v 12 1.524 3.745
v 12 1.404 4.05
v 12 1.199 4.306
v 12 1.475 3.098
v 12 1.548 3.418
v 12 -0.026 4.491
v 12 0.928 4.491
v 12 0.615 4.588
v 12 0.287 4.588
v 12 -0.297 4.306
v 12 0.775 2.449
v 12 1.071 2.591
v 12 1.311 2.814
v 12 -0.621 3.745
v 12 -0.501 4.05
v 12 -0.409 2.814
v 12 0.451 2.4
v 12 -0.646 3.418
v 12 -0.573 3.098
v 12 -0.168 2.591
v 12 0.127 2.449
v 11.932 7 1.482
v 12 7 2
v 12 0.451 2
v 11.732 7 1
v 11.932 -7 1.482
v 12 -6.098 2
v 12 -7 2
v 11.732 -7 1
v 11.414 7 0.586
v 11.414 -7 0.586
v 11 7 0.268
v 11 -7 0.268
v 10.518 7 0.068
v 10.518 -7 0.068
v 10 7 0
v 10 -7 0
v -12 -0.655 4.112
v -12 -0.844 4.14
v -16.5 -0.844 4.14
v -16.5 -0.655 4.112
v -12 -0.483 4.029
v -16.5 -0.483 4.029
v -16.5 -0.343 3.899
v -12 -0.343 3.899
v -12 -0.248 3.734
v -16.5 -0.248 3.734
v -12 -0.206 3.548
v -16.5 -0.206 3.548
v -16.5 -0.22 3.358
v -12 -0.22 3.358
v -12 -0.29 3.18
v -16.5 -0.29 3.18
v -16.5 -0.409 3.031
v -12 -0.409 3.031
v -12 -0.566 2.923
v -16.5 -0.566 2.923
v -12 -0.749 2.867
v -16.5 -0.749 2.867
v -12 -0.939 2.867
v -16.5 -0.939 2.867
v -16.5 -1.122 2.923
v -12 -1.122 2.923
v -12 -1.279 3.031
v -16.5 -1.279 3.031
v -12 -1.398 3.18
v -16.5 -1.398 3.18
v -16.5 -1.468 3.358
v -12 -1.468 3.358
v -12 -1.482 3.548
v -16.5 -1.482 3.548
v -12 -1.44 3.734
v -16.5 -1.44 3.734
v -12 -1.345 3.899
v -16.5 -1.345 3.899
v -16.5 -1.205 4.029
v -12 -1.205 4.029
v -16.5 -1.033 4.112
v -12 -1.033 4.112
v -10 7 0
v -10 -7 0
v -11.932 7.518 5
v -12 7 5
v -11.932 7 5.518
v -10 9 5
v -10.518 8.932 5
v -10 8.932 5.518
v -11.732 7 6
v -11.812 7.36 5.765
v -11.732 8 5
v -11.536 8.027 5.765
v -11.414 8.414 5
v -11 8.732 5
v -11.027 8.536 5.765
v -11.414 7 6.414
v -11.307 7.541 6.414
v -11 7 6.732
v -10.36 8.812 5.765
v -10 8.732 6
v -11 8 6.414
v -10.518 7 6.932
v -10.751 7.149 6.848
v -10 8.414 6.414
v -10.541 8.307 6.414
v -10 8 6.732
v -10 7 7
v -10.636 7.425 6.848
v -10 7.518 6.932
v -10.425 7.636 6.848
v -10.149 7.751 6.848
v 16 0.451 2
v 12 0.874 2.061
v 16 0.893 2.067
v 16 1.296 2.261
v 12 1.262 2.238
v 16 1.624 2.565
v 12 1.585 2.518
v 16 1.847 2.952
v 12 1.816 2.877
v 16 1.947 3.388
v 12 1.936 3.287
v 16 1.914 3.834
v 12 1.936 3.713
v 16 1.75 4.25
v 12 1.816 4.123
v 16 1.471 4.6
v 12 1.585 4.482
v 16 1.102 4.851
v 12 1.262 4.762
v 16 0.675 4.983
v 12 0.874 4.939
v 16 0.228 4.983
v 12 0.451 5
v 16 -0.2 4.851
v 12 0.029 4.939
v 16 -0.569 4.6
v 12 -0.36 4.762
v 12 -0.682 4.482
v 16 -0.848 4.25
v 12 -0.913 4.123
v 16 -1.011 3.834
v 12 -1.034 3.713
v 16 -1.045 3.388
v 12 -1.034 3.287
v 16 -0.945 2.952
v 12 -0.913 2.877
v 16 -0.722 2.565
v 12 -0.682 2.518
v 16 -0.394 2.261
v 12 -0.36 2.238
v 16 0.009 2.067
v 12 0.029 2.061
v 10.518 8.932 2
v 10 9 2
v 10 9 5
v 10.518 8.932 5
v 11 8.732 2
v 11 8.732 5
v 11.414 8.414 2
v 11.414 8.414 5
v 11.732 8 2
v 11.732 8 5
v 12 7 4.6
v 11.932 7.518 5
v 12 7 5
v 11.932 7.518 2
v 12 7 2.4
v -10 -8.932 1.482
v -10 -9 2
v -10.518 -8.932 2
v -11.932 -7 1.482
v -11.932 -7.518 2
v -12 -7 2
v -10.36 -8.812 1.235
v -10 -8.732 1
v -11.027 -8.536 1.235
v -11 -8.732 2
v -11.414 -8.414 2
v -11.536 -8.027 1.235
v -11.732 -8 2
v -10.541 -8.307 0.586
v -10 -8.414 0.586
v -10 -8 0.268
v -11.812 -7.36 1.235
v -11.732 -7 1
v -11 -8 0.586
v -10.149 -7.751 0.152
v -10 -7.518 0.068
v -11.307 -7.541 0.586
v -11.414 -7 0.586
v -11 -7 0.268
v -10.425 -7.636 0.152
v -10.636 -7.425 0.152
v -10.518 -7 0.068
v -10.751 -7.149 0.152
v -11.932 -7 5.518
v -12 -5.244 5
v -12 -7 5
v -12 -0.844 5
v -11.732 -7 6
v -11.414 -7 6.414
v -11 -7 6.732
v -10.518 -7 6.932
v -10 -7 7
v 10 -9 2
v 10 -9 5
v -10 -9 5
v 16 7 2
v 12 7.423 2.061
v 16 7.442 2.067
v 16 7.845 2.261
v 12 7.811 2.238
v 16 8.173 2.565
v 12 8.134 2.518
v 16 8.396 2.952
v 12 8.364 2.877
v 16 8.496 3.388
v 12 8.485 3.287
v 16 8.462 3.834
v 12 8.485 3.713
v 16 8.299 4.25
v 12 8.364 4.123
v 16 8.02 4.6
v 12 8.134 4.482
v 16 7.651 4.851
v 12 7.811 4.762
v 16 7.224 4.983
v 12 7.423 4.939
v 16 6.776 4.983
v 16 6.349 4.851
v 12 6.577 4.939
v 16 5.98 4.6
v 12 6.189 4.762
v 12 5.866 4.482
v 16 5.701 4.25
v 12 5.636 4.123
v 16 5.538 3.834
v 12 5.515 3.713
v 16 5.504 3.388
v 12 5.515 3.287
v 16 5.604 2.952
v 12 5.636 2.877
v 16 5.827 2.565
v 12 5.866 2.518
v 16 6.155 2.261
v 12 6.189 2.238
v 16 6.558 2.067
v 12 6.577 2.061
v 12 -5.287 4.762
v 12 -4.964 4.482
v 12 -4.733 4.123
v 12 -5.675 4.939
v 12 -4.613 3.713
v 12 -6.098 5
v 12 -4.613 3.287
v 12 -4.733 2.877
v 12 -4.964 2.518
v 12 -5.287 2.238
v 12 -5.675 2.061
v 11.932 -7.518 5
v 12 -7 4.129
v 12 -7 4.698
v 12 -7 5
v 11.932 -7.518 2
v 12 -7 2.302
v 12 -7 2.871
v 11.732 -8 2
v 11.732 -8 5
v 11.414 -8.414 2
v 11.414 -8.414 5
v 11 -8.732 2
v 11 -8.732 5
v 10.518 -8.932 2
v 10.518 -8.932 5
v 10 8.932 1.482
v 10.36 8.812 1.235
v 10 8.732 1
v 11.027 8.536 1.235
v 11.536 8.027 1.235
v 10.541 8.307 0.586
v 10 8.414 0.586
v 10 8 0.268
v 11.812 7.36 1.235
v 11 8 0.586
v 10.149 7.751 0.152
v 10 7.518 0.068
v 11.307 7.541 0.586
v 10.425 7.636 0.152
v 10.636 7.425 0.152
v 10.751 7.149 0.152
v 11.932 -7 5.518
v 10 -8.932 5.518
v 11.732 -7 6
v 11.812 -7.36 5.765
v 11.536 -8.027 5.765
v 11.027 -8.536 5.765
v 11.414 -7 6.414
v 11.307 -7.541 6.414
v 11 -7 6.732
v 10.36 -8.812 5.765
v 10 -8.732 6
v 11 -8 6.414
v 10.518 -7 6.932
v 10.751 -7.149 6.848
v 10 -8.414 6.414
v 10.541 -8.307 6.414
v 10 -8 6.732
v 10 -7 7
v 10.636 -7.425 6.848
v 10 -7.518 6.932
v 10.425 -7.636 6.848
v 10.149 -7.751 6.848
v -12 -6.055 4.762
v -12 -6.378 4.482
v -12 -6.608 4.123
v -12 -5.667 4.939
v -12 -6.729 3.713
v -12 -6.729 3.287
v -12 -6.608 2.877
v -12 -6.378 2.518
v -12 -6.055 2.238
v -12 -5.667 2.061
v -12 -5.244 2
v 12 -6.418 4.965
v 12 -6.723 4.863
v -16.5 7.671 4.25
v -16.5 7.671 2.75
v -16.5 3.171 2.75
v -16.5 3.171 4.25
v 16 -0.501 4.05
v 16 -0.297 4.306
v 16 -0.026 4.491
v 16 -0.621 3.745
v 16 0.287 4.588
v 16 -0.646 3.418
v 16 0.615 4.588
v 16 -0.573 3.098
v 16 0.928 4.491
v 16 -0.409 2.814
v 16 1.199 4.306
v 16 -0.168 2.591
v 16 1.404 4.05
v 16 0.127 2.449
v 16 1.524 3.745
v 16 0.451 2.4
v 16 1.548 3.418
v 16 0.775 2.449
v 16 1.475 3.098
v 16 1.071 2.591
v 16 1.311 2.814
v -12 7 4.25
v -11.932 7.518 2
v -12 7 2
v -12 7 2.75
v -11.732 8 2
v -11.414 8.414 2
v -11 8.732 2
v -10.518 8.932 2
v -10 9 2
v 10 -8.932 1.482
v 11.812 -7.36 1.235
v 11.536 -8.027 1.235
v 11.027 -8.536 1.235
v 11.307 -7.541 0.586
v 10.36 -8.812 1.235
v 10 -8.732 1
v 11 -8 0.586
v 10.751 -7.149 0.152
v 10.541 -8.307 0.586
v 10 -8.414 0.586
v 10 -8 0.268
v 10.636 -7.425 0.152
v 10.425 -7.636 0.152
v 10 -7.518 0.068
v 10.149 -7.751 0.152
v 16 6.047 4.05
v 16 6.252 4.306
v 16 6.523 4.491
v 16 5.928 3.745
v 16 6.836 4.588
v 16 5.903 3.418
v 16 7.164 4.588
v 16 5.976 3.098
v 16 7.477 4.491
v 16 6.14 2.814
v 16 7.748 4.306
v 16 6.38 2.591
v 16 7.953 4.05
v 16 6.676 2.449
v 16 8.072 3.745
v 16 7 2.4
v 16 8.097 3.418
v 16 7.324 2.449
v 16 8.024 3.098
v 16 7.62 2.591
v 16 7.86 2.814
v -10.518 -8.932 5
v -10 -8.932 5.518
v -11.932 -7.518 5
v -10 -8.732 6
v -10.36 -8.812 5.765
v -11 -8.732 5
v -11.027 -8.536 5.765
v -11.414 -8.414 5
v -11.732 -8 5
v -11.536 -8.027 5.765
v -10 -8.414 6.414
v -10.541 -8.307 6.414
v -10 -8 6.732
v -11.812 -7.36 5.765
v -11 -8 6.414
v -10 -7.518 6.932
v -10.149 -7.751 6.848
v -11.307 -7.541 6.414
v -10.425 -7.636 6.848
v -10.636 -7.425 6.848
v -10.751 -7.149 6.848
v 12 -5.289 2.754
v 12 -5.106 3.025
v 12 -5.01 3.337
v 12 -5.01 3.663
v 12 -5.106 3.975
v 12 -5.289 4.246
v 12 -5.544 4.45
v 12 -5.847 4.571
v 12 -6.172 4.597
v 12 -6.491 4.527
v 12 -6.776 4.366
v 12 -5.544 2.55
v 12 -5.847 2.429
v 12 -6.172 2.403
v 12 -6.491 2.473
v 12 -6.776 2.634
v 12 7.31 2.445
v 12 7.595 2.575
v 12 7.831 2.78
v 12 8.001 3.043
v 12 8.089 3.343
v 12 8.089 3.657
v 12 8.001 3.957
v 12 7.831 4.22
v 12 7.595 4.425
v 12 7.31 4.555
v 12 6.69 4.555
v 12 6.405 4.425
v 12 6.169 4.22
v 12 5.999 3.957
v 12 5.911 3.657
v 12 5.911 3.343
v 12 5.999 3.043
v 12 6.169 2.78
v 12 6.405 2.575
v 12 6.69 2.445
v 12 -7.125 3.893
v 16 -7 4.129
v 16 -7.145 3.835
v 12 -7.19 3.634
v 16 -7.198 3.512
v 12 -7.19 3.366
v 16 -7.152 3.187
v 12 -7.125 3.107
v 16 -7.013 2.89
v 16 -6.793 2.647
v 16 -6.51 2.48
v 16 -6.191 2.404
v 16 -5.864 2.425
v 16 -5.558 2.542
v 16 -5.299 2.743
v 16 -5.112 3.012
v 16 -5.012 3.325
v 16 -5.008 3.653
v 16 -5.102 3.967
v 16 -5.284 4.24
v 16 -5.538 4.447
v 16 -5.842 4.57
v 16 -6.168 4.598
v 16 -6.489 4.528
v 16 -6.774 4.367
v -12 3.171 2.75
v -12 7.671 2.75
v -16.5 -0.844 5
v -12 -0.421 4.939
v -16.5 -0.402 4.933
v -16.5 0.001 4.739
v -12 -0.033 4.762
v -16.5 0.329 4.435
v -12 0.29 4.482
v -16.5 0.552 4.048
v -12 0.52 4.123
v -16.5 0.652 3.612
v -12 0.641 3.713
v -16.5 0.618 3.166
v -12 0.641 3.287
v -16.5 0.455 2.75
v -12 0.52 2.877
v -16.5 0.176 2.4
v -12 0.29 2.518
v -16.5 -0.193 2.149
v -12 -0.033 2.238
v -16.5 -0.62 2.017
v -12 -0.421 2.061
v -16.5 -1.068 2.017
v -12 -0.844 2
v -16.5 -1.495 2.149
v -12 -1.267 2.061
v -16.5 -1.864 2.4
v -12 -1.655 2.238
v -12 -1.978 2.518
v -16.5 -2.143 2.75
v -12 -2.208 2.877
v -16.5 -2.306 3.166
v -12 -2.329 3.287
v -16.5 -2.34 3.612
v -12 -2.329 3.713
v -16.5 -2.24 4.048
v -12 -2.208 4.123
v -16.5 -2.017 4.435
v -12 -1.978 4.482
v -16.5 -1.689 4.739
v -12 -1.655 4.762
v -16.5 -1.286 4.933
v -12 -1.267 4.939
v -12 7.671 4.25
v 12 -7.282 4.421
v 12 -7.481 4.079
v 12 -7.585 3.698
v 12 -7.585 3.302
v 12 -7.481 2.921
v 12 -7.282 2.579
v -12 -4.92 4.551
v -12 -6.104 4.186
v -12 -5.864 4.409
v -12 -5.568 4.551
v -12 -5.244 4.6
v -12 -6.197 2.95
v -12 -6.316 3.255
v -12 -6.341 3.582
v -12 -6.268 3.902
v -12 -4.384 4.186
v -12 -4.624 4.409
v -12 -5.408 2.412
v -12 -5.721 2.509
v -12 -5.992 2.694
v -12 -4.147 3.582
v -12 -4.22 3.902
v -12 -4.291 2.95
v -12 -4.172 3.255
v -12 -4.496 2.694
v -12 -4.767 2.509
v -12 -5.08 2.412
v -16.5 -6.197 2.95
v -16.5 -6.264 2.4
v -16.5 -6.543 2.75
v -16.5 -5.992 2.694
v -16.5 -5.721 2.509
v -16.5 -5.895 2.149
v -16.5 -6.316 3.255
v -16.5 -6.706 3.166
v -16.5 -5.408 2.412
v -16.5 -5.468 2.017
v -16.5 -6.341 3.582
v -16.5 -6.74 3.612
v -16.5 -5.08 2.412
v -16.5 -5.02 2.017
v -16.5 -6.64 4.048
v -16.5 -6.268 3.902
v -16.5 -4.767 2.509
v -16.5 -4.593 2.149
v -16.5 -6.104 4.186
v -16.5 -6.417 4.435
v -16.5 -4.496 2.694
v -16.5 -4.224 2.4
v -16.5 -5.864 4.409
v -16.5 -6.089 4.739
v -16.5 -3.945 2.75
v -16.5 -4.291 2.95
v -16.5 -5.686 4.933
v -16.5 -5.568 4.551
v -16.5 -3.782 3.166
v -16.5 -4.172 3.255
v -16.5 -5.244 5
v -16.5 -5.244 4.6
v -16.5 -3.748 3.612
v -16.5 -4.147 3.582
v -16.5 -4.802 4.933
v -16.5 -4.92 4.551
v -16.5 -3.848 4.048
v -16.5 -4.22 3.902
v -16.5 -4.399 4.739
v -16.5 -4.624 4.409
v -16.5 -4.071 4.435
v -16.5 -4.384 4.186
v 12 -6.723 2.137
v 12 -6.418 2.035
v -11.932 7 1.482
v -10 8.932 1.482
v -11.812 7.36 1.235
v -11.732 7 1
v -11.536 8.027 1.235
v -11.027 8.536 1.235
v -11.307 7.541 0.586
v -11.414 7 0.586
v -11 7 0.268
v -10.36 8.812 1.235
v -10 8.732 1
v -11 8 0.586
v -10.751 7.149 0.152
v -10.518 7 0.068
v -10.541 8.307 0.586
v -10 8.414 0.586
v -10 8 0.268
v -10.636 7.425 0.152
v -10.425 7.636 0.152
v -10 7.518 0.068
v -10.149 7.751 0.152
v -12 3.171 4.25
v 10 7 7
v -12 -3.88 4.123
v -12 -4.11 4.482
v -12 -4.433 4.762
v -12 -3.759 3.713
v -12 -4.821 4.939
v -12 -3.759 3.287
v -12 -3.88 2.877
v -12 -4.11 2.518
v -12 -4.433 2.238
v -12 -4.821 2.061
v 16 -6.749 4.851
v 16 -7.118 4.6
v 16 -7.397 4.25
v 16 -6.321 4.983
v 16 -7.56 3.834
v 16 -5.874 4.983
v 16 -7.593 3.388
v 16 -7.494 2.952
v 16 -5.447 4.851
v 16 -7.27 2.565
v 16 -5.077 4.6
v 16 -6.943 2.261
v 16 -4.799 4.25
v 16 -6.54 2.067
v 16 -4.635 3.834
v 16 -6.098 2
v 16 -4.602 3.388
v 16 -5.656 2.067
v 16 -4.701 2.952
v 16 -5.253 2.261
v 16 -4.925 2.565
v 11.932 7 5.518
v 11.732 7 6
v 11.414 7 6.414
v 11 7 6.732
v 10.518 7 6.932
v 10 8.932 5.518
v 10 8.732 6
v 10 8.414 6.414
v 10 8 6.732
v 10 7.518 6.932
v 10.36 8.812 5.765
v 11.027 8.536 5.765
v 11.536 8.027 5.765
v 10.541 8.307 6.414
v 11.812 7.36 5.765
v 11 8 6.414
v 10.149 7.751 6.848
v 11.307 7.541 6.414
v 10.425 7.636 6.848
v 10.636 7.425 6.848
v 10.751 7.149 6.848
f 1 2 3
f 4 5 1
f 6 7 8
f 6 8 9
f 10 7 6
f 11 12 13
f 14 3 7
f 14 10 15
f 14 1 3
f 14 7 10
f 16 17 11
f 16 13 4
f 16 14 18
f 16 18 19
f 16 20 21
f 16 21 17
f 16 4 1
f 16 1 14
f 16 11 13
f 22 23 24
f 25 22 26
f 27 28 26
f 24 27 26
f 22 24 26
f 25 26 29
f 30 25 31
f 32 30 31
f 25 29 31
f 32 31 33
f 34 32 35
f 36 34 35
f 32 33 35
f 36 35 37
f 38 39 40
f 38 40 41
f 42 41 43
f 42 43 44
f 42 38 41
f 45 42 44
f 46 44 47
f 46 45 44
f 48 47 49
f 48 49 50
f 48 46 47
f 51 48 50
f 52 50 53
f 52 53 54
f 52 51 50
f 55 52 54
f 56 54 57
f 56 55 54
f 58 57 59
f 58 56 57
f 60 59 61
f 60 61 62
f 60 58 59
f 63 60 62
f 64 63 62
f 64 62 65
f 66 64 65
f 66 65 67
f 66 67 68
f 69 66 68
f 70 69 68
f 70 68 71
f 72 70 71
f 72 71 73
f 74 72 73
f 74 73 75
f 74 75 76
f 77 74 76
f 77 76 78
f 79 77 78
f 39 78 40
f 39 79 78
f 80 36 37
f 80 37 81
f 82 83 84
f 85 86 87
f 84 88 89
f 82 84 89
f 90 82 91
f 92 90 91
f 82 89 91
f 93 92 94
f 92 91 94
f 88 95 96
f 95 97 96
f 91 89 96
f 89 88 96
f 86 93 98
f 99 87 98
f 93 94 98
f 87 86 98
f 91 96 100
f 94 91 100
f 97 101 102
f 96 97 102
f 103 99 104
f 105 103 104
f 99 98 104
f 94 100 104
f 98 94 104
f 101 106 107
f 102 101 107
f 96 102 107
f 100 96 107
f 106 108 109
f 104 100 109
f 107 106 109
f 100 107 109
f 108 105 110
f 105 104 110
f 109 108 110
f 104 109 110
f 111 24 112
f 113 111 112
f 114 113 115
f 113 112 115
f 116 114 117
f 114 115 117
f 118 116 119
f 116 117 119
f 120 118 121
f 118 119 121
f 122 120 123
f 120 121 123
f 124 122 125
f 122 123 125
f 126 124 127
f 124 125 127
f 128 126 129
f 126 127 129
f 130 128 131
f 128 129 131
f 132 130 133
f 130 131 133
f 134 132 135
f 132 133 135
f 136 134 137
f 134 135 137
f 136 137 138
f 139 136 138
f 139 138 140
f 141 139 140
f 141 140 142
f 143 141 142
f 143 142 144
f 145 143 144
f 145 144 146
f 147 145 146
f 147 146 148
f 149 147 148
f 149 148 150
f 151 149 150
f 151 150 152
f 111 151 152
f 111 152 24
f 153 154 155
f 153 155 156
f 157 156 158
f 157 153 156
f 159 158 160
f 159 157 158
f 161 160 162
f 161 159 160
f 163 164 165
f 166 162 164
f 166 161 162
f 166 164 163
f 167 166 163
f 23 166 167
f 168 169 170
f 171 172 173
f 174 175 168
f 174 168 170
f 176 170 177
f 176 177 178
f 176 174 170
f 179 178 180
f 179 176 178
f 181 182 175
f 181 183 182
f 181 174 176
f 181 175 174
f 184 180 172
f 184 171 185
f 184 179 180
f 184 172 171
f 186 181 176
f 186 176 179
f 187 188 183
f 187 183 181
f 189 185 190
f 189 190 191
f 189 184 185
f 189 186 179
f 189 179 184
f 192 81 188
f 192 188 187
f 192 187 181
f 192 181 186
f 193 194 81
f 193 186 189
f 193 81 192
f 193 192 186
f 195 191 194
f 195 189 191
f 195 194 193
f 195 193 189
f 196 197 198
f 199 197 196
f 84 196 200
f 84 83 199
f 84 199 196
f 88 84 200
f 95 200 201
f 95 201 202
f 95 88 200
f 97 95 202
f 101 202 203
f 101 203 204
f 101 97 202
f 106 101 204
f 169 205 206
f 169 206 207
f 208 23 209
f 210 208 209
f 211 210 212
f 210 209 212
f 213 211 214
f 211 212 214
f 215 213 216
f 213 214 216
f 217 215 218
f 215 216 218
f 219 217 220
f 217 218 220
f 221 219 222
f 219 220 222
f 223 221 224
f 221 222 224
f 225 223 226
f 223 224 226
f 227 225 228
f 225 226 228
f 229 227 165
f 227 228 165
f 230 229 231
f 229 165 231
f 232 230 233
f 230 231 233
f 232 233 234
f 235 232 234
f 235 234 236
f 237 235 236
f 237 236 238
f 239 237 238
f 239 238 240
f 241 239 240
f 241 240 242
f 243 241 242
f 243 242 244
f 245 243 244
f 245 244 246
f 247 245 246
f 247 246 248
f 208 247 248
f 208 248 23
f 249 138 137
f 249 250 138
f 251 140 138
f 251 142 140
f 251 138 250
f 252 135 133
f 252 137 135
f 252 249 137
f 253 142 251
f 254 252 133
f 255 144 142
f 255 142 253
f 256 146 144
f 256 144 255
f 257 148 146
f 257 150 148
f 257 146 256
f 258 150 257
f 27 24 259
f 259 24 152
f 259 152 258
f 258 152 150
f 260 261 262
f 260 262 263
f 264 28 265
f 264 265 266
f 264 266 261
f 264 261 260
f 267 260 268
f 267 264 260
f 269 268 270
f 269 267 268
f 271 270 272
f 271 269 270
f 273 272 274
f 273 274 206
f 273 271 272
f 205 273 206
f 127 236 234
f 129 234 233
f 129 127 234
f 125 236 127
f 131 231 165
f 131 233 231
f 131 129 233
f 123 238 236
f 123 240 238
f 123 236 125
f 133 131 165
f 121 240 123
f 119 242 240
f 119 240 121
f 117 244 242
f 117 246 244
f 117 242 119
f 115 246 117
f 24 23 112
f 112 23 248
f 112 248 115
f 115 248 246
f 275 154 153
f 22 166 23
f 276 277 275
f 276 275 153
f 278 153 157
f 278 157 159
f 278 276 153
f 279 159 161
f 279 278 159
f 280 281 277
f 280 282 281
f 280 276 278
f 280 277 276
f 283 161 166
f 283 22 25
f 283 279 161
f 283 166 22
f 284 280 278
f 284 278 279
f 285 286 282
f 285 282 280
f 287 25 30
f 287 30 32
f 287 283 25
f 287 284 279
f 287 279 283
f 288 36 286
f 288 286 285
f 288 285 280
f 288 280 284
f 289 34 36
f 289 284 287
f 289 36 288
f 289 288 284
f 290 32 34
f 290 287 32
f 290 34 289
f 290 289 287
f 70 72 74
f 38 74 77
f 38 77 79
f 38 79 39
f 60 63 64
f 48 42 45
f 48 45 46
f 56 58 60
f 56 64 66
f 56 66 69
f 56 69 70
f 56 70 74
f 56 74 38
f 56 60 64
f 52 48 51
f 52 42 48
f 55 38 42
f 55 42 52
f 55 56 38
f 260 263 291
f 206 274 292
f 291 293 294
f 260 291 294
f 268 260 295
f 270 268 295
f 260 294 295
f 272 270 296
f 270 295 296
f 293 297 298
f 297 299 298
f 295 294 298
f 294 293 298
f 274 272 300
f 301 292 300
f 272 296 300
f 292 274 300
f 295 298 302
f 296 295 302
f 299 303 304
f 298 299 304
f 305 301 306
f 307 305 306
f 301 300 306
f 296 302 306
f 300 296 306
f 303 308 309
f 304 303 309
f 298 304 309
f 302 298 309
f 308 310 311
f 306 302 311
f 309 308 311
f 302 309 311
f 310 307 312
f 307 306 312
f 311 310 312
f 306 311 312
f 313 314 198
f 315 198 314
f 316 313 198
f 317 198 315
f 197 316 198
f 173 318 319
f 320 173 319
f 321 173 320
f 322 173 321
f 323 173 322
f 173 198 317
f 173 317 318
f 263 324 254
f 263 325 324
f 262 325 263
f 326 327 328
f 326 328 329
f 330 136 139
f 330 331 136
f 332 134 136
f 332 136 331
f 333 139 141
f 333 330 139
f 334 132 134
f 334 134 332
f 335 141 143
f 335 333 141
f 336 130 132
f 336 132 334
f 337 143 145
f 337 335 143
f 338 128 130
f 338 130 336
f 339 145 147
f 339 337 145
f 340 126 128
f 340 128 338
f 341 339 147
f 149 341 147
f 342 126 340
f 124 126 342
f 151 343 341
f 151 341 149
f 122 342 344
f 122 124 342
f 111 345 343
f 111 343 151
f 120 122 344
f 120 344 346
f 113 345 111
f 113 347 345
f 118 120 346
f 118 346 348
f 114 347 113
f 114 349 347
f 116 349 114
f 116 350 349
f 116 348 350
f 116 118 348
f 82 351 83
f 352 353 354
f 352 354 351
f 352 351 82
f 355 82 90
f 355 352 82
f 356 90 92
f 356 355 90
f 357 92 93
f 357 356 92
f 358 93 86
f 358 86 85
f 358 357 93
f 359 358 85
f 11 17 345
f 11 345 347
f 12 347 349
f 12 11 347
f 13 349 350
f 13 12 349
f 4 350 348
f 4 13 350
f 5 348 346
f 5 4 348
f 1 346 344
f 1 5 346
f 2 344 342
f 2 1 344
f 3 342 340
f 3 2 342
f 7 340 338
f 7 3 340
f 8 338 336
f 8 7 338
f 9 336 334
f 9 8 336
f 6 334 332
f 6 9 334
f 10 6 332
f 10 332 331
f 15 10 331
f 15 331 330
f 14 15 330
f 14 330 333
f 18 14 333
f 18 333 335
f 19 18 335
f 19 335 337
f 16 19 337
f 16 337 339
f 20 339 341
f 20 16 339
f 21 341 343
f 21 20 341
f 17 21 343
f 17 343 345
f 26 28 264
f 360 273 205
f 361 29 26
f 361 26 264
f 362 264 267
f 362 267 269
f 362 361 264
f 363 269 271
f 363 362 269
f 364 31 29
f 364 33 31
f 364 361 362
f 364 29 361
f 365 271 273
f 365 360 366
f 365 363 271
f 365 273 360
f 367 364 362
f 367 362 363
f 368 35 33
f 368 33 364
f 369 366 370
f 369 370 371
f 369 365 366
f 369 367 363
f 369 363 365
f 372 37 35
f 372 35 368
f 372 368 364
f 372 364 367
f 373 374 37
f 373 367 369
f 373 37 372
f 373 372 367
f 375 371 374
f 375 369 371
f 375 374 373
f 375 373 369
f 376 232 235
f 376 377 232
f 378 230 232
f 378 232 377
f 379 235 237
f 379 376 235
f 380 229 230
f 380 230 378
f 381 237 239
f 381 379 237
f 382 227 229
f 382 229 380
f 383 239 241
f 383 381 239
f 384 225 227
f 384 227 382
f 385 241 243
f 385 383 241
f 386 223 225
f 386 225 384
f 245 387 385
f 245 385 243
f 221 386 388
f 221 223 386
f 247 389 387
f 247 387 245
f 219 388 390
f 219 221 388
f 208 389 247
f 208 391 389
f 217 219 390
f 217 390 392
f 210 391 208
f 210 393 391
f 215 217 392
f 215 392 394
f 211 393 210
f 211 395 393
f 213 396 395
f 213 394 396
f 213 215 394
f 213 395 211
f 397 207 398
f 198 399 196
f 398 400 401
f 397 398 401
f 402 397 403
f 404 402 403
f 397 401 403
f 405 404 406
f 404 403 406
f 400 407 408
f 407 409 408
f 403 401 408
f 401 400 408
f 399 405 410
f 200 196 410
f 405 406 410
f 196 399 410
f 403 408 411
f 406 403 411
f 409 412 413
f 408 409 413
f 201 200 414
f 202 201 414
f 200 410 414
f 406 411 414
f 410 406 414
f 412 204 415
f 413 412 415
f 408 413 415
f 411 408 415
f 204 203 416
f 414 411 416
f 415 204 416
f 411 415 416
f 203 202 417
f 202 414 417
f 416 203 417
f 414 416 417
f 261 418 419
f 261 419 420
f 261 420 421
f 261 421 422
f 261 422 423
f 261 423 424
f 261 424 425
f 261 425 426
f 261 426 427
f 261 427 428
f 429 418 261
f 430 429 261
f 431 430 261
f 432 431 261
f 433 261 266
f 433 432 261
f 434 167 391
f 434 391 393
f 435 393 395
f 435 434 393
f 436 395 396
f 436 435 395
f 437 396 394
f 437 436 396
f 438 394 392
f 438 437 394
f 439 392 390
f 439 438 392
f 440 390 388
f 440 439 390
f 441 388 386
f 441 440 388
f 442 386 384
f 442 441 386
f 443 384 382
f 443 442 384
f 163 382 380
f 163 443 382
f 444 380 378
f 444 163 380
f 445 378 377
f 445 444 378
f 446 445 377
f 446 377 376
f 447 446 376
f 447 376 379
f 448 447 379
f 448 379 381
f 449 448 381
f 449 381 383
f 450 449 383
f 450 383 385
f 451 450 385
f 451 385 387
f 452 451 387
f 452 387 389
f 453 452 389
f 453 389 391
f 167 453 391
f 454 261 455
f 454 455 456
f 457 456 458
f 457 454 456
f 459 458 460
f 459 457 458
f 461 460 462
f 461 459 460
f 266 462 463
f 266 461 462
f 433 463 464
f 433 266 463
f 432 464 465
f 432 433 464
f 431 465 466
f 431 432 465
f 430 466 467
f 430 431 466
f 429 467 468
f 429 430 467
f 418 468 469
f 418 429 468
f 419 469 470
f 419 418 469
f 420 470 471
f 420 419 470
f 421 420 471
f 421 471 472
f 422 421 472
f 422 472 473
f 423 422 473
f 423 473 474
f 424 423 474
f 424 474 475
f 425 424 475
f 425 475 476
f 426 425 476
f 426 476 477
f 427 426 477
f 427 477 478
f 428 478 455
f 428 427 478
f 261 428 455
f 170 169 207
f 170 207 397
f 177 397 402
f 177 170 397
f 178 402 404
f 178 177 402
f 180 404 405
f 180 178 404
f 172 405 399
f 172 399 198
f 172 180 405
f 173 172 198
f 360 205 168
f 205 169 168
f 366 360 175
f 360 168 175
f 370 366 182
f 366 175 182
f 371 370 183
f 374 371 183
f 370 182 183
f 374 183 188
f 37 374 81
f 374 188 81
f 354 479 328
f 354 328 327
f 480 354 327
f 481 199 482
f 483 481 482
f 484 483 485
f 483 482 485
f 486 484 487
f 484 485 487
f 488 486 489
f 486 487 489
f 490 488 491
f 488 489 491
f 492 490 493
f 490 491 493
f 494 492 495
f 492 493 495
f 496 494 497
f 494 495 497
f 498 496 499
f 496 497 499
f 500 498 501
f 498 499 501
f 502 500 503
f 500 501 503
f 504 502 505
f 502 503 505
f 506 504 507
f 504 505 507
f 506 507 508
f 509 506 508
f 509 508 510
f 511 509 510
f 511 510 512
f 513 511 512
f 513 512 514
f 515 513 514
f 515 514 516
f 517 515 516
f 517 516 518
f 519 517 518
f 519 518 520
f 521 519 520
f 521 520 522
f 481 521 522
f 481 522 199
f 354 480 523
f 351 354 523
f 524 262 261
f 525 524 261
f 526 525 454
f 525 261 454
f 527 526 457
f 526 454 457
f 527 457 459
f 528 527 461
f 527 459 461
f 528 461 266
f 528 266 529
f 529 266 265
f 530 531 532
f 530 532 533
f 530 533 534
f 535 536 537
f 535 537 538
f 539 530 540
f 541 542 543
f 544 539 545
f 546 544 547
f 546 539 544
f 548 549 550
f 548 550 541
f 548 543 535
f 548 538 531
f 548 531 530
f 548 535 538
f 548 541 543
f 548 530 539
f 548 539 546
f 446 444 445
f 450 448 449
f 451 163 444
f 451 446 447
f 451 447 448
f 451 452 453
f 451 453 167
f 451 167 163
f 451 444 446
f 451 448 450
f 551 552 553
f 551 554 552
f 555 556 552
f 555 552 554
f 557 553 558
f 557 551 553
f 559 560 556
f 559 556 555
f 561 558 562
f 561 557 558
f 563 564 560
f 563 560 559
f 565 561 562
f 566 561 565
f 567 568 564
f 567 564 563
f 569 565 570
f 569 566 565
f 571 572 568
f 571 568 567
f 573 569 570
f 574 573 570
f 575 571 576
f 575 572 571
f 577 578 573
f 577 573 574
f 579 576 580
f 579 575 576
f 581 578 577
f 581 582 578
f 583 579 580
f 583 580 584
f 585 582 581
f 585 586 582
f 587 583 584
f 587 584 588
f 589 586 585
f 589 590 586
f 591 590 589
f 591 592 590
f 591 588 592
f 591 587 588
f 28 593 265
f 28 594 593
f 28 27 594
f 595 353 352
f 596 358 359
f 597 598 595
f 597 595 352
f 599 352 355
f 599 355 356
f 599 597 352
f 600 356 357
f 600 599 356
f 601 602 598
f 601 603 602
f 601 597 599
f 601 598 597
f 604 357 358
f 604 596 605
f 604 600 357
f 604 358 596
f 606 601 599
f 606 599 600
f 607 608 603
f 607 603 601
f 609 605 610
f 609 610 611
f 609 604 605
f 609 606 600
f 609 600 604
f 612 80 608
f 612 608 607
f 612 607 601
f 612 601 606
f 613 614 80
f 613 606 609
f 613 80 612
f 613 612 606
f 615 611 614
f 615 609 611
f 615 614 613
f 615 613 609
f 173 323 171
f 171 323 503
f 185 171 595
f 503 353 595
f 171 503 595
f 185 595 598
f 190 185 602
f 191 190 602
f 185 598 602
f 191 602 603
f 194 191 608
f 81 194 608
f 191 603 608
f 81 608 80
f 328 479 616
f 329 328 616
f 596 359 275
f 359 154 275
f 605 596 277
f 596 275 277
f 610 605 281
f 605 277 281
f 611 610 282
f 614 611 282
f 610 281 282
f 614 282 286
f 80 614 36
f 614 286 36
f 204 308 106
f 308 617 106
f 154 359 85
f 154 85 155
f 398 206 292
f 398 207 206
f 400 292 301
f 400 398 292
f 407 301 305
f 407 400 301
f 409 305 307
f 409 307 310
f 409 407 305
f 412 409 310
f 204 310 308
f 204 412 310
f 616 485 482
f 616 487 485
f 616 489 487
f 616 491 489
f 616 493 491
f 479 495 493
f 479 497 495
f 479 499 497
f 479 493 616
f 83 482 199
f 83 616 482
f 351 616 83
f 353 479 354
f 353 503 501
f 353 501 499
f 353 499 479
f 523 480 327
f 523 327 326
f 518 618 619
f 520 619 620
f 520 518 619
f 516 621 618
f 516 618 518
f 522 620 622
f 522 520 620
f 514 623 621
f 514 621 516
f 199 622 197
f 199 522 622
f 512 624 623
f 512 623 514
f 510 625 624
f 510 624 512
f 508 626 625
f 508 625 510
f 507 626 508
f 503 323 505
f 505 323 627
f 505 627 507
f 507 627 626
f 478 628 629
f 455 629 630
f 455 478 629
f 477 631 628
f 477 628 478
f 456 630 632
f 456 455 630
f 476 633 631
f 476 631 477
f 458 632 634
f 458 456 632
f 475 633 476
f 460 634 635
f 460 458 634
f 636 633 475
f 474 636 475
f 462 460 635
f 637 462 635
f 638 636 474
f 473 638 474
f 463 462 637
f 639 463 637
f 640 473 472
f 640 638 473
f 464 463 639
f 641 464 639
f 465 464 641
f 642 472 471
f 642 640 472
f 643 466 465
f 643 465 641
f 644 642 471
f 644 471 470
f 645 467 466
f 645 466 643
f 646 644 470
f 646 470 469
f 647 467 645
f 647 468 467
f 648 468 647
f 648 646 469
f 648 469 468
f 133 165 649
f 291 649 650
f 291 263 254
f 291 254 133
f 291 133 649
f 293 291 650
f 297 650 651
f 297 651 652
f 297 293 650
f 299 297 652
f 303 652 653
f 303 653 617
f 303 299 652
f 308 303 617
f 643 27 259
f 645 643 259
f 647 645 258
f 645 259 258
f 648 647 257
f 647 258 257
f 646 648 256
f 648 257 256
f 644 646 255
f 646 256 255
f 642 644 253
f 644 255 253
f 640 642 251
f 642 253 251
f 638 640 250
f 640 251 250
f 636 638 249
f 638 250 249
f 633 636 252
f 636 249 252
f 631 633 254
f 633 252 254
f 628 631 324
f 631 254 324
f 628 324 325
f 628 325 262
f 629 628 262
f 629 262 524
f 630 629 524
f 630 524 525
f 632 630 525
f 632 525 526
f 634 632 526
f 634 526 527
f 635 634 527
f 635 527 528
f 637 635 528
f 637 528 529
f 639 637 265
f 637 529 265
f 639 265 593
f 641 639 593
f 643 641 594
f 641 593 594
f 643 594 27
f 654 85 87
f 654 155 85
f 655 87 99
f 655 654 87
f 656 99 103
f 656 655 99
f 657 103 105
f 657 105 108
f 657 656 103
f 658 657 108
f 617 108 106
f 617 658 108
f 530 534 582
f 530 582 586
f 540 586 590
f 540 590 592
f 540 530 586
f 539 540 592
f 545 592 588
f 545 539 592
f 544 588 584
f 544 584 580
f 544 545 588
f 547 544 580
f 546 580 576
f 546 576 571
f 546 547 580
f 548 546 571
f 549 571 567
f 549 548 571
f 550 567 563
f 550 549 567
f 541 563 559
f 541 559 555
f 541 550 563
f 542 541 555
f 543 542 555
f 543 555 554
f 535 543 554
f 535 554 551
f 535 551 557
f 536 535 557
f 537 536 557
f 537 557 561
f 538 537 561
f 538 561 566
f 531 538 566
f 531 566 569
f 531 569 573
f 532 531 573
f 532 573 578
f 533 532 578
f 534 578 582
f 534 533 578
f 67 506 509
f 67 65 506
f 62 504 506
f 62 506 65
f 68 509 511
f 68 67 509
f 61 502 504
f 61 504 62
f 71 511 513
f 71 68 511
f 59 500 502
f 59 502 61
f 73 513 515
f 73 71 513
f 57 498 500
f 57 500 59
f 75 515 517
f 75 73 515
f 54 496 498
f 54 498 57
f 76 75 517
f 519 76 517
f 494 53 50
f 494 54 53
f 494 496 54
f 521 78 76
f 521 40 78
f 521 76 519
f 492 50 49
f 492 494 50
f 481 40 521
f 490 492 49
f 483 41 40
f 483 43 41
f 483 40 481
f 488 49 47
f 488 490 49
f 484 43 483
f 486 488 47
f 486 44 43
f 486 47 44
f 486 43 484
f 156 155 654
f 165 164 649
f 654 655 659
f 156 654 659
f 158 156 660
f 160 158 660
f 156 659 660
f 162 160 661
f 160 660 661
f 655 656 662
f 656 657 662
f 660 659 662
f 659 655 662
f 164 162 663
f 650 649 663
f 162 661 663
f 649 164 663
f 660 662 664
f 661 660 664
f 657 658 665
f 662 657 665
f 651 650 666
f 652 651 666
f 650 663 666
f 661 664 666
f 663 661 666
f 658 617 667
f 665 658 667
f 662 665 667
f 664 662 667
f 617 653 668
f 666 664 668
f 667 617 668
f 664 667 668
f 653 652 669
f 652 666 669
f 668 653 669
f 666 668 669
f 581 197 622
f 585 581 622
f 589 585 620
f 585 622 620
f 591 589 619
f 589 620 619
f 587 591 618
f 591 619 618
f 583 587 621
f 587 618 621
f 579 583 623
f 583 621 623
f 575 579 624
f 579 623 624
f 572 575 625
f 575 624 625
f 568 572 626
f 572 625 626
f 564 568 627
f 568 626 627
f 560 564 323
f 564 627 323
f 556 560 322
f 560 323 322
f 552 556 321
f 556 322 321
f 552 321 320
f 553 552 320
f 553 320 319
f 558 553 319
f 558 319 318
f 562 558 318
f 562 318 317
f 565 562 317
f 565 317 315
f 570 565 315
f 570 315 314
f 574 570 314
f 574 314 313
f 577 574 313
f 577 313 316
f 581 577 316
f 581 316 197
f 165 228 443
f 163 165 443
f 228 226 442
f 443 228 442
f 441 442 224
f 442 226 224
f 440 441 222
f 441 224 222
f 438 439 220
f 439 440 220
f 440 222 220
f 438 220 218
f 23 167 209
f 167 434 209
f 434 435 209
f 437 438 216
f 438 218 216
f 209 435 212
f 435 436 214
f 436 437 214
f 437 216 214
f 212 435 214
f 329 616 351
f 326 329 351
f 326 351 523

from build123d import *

# Parameters (mm, degrees)
BOSS_EXTRUDE1_DEPTH = 7
FILLET1_R           = 2
SKETCH3_R           = 1.5
SKETCH3_R_2         = 1.1
BOSS_EXTRUDE2_DEPTH = 4
SKETCH4_R           = 1.5
SKETCH4_R_2         = 0.640256745
SKETCH4_R_3         = 1.1
SKETCH4_W           = 1.5
SKETCH4_H           = 4.5
BOSS_EXTRUDE3_DEPTH = 4.5


with BuildPart() as part:
    # Sketch1 → Boss-Extrude1 (new body)
    with BuildSketch(Plane.XY):
        with BuildLine():
            Line((10, -9), (-10, -9))
            ThreePointArc((-10, -9), (-11.414213562, -8.414213562), (-12, -7))
            Line((-12, -7), (-12, 7))
            ThreePointArc((-12, 7), (-11.414213562, 8.414213562), (-10, 9))
            Line((-10, 9), (10, 9))
            ThreePointArc((10, 9), (11.414213562, 8.414213562), (12, 7))
            Line((12, 7), (12, -7))
            ThreePointArc((12, -7), (11.414213562, -8.414213562), (10, -9))
        make_face()
    extrude(amount=BOSS_EXTRUDE1_DEPTH)

    # Fillet1
    fillet1_edges = [part.edges().sort_by_distance(p)[0] for p in [
        (12, 0, 0),
        (11.414213562, -8.414213562, 0),
        (0, -9, 0),
        (-11.414213562, -8.414213562, 0),
        (11.414213562, -8.414213562, 7),
        (12, 0, 7),
        (11.414213562, 8.414213562, 7),
        (0, 9, 7),
        (-11.414213562, 8.414213562, 7),
        (-12, 0, 7),
        (-11.414213562, -8.414213562, 7),
        (-12, 0, 0),
        (0, -9, 7),
        (-11.414213562, 8.414213562, 0),
        (0, 9, 0),
        (11.414213562, 8.414213562, 0),
    ]]
    fillet(fillet1_edges, radius=FILLET1_R)

    # Sketch3 → Boss-Extrude2 (add)
    # profile 1 of 3: a face of its own
    with BuildSketch(Plane(origin=(12, 0, 0), x_dir=(0, 0, -1), z_dir=(1, 0, 0))):
        with Locations((-3.5, 7)):
            Circle(SKETCH3_R)
        with Locations((-3.5, 7)):
            Circle(SKETCH3_R_2, mode=Mode.SUBTRACT)
    # profile 2 of 3: a face of its own
    with BuildSketch(Plane(origin=(12, 0, 0), x_dir=(0, 0, -1), z_dir=(1, 0, 0))):
        with Locations((-3.5, 0.451158359)):
            Circle(SKETCH3_R)
        with Locations((-3.5, 0.451158359)):
            Circle(SKETCH3_R_2, mode=Mode.SUBTRACT)
    # profile 3 of 3: a face of its own
    with BuildSketch(Plane(origin=(12, 0, 0), x_dir=(0, 0, -1), z_dir=(1, 0, 0))):
        with Locations((-3.5, -6.097683282)):
            Circle(SKETCH3_R)
        with Locations(Location((-3.5, -6.097683282, 0), (0, 0, 235.113626632))):
            Circle(SKETCH3_R_2, mode=Mode.SUBTRACT)
    extrude(amount=BOSS_EXTRUDE2_DEPTH)

    # Sketch4 → Boss-Extrude3 (add)
    # profile 1 of 3: a face of its own
    with BuildSketch(Plane.ZY.offset(12)):
        with Locations((3.5, -0.844007622)):
            Circle(SKETCH4_R)
        with Locations((3.5, -0.844007622)):
            Circle(SKETCH4_R_2, mode=Mode.SUBTRACT)
    # profile 2 of 3: a face of its own
    with BuildSketch(Plane.ZY.offset(12)):
        with Locations((3.5, -5.244007622)):
            Circle(SKETCH4_R)
        with Locations((3.5, -5.244007622)):
            Circle(SKETCH4_R_3, mode=Mode.SUBTRACT)
    # profile 3 of 3: a face of its own
    with BuildSketch(Plane.ZY.offset(12)):
        with Locations((3.5, 5.420795306)):
            Rectangle(SKETCH4_W, SKETCH4_H)
    extrude(amount=BOSS_EXTRUDE3_DEPTH)


solid = part.part
